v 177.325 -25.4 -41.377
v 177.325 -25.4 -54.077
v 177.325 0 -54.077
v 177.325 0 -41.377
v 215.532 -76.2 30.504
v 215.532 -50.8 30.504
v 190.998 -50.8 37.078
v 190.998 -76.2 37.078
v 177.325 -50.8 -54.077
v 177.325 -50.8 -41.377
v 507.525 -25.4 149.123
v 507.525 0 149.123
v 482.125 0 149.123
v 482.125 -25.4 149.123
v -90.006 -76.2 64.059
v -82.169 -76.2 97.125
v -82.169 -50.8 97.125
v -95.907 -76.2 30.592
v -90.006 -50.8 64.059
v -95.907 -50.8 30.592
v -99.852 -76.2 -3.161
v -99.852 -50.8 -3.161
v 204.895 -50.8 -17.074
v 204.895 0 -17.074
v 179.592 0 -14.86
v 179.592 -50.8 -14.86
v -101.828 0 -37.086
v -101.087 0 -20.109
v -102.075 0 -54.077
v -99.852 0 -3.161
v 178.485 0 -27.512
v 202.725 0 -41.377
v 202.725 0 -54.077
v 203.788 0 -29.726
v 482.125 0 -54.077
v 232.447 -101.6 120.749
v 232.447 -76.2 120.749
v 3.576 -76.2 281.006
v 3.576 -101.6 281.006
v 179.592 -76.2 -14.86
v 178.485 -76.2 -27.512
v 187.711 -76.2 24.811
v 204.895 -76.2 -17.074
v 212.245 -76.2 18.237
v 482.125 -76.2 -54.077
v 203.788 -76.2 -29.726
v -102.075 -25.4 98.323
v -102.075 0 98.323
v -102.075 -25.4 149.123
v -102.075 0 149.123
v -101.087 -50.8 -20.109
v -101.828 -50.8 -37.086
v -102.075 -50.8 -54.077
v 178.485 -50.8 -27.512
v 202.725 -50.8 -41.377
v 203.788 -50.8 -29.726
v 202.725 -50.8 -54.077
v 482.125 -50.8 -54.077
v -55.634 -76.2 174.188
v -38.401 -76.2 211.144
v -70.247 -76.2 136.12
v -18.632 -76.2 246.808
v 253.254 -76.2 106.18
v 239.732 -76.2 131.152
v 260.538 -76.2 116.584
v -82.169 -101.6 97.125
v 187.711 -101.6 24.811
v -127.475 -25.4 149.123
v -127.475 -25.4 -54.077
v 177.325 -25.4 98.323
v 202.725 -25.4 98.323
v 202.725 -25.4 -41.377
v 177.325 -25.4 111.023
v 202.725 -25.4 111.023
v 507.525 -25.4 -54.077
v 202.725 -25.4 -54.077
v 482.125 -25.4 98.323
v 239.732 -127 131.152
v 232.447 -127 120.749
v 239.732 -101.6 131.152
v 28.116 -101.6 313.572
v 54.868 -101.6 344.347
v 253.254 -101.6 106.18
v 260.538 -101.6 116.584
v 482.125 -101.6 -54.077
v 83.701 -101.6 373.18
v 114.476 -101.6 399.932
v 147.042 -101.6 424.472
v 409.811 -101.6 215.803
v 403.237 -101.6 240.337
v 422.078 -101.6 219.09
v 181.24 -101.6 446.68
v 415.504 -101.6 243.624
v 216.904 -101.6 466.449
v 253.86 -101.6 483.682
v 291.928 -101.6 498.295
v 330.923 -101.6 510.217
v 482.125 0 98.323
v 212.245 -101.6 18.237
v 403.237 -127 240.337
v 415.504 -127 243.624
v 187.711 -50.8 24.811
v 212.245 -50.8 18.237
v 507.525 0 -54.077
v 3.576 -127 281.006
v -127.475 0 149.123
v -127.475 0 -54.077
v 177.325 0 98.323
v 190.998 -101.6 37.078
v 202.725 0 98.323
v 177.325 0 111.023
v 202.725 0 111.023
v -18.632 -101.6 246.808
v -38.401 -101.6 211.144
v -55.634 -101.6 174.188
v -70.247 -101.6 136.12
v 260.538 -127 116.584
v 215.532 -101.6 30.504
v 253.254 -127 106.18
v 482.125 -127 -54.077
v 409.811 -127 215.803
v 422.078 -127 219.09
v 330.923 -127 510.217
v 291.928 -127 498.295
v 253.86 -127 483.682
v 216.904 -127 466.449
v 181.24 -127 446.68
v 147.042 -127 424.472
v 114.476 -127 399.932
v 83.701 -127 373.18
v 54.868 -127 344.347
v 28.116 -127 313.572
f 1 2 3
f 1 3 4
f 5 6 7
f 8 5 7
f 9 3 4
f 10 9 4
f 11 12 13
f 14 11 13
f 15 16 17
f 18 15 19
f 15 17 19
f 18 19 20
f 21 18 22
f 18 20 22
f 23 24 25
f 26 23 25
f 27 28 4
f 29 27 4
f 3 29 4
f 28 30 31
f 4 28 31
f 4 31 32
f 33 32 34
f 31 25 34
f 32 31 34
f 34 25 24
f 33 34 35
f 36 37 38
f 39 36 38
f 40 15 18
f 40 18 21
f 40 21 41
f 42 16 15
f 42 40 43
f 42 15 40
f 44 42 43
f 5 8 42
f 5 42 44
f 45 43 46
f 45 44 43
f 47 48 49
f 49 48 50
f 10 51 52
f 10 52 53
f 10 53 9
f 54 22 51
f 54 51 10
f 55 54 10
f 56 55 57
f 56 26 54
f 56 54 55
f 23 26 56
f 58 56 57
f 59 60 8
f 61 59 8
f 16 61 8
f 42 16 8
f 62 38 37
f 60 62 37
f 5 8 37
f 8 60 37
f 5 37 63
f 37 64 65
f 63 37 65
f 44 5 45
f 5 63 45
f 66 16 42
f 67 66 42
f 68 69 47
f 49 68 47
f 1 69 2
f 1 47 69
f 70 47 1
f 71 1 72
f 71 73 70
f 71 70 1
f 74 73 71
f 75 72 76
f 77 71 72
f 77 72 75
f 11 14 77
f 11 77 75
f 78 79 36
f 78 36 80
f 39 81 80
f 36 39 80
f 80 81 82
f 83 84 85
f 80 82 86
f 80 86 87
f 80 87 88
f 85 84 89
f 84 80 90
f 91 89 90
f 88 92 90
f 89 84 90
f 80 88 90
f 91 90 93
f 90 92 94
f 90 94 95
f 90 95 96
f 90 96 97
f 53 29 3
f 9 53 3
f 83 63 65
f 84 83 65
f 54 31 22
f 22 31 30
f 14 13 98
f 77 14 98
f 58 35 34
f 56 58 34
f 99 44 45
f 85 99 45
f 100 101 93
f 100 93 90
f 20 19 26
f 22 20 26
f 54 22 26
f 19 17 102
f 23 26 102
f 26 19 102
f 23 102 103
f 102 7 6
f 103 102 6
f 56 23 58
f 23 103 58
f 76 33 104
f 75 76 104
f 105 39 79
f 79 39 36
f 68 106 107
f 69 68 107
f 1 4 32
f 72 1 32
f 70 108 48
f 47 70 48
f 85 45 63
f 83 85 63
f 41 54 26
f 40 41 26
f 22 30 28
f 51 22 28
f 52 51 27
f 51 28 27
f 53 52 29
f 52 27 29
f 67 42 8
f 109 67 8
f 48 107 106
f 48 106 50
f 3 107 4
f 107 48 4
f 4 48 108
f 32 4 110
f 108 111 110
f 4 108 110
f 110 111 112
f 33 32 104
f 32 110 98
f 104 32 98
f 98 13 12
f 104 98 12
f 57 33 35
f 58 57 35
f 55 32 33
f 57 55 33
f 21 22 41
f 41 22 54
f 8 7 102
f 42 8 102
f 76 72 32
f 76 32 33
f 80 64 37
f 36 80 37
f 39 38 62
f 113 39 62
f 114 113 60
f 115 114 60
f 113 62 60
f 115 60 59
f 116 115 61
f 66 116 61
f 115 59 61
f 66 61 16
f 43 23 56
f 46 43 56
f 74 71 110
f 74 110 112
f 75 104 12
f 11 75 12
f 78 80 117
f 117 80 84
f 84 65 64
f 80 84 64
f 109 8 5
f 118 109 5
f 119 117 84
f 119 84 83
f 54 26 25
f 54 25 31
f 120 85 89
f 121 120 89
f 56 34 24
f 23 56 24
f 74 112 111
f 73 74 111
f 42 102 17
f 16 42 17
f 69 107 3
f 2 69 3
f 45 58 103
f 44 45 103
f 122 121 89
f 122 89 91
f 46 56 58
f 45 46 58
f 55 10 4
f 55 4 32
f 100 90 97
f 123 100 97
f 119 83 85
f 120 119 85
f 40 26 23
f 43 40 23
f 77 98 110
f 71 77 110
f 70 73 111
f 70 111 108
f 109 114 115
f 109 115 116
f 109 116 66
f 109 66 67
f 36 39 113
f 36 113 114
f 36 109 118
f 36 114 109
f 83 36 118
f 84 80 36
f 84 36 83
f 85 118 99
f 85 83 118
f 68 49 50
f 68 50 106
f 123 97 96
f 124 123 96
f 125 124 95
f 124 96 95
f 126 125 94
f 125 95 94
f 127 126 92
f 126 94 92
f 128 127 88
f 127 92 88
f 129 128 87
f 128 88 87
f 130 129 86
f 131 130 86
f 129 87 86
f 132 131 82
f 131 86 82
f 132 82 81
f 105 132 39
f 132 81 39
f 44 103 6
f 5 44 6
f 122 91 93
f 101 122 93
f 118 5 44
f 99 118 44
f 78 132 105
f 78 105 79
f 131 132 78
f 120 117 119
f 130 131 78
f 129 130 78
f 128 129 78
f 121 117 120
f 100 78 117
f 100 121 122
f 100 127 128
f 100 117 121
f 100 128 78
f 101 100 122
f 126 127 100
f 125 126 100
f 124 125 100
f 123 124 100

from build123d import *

# Parameters (mm, degrees)
F1_DEPTH = 25.4
F2_DEPTH = 50.8
F4_DEPTH = 25.4
F6_DEPTH = 25.4
F8_DEPTH = 25.4


with BuildPart() as f1:
    # F0 (on Front) → F1 (new body)
    with BuildSketch(Plane.XZ):
        with BuildLine():
            Line((-127.475058, 149.123092), (-127.475058, -54.076908))
            Line((-127.475058, -54.076908), (-102.075058, -54.076908))
            ThreePointArc((-102.075058, -54.076908), (-101.519029, -28.594462), (-99.852001, -3.160523))
            Line((-99.852001, -3.160523), (178.484798, -27.511838))
            Line((178.484798, -27.511838), (179.591676, -14.860165))
            Line((179.591676, -14.860165), (204.895021, -17.073921))
            Line((204.895021, -17.073921), (203.788143, -29.725593))
            Line((203.788143, -29.725593), (482.124942, -54.076908))
            Line((482.124942, -54.076908), (507.524942, -54.076908))
            Line((507.524942, -54.076908), (507.524942, 149.123092))
            Line((507.524942, 149.123092), (482.124942, 149.123092))
            Line((482.124942, 149.123092), (482.124942, 98.323092))
            Line((482.124942, 98.323092), (202.724942, 98.323092))
            Line((202.724942, 98.323092), (202.724942, 111.023092))
            Line((202.724942, 111.023092), (177.324942, 111.023092))
            Line((177.324942, 111.023092), (177.324942, 98.323092))
            Line((177.324942, 98.323092), (-102.075058, 98.323092))
            Line((-102.075058, 98.323092), (-102.075058, 149.123092))
            Line((-102.075058, 149.123092), (-127.475058, 149.123092))
        make_face()
        with BuildLine():
            ThreePointArc((-99.852001, -3.160523), (-101.519029, -28.594462), (-102.075058, -54.076908))
            Line((-102.075058, -54.076908), (177.324942, -54.076908))
            Line((177.324942, -54.076908), (177.324942, -41.376908))
            Line((177.324942, -41.376908), (202.724942, -41.376908))
            Line((202.724942, -41.376908), (202.724942, -54.076908))
            Line((202.724942, -54.076908), (482.124942, -54.076908))
            Line((482.124942, -54.076908), (203.788143, -29.725593))
            Line((203.788143, -29.725593), (204.895021, -17.073921))
            Line((204.895021, -17.073921), (179.591676, -14.860165))
            Line((179.591676, -14.860165), (178.484798, -27.511838))
            Line((178.484798, -27.511838), (-99.852001, -3.160523))
        make_face()
    extrude(amount=F1_DEPTH)


with BuildPart() as f2:
    # F0 (on Front) → F2 (new body)
    with BuildSketch(Plane.XZ):
        with BuildLine():
            ThreePointArc((-99.852001, -3.160523), (-101.519029, -28.594462), (-102.075058, -54.076908))
            Line((-102.075058, -54.076908), (177.324942, -54.076908))
            Line((177.324942, -54.076908), (177.324942, -41.376908))
            Line((177.324942, -41.376908), (202.724942, -41.376908))
            Line((202.724942, -41.376908), (202.724942, -54.076908))
            Line((202.724942, -54.076908), (482.124942, -54.076908))
            Line((482.124942, -54.076908), (203.788143, -29.725593))
            Line((203.788143, -29.725593), (204.895021, -17.073921))
            Line((204.895021, -17.073921), (179.591676, -14.860165))
            Line((179.591676, -14.860165), (178.484798, -27.511838))
            Line((178.484798, -27.511838), (-99.852001, -3.160523))
        make_face()
    extrude(amount=F2_DEPTH)


with BuildPart() as f4:
    # F3 (on face) → F4 (new body)
    with BuildSketch(Plane.XZ.offset(50.8)):
        with BuildLine():
            ThreePointArc((-82.168926, 97.125178), (-93.199748, 47.368357), (-99.852001, -3.160523))
            Line((-99.852001, -3.160523), (178.484798, -27.511838))
            Line((178.484798, -27.511838), (179.591676, -14.860165))
            Line((179.591676, -14.860165), (204.895021, -17.073921))
            Line((204.895021, -17.073921), (203.788143, -29.725593))
            Line((203.788143, -29.725593), (482.124942, -54.076908))
            Line((482.124942, -54.076908), (212.245266, 18.237133))
            Line((212.245266, 18.237133), (215.532268, 30.504391))
            Line((215.532268, 30.504391), (190.997752, 37.078395))
            Line((190.997752, 37.078395), (187.71075, 24.811137))
            Line((187.71075, 24.811137), (-82.168926, 97.125178))
        make_face()
    extrude(amount=F4_DEPTH)


with BuildPart() as f6:
    # F5 (on face) → F6 (new body)
    with BuildSketch(Plane.XZ.offset(76.2)):
        with BuildLine():
            Line((215.532268, 30.504391), (212.245266, 18.237133))
            Line((212.245266, 18.237133), (482.124942, -54.076908))
            Line((482.124942, -54.076908), (253.253861, 106.180348))
            Line((253.253861, 106.180348), (260.538281, 116.583579))
            Line((260.538281, 116.583579), (239.731819, 131.152421))
            Line((239.731819, 131.152421), (232.447399, 120.74919))
            Line((232.447399, 120.74919), (3.576317, 281.006446))
            ThreePointArc((3.576317, 281.006446), (-47.340067, 192.81668), (-82.168926, 97.125178))
            Line((-82.168926, 97.125178), (187.71075, 24.811137))
            Line((187.71075, 24.811137), (190.997752, 37.078395))
            Line((190.997752, 37.078395), (215.532268, 30.504391))
        make_face()
    extrude(amount=F6_DEPTH)


with BuildPart() as f8:
    # F7 (on face) → F8 (new body)
    with BuildSketch(Plane.XZ.offset(101.6)):
        with BuildLine():
            Line((232.447399, 120.74919), (239.731819, 131.152421))
            Line((239.731819, 131.152421), (260.538281, 116.583579))
            Line((260.538281, 116.583579), (253.253861, 106.180348))
            Line((253.253861, 106.180348), (482.124942, -54.076908))
            Line((482.124942, -54.076908), (409.810901, 215.802768))
            Line((409.810901, 215.802768), (422.078159, 219.08977))
            Line((422.078159, 219.08977), (415.504155, 243.624286))
            Line((415.504155, 243.624286), (403.236897, 240.337284))
            Line((403.236897, 240.337284), (330.922856, 510.21696))
            ThreePointArc((330.922856, 510.21696), (147.041588, 424.471716), (3.576317, 281.006446))
            Line((3.576317, 281.006446), (232.447399, 120.74919))
        make_face()
    extrude(amount=F8_DEPTH)


solid = Compound([f1.part, f2.part, f4.part, f6.part, f8.part])
